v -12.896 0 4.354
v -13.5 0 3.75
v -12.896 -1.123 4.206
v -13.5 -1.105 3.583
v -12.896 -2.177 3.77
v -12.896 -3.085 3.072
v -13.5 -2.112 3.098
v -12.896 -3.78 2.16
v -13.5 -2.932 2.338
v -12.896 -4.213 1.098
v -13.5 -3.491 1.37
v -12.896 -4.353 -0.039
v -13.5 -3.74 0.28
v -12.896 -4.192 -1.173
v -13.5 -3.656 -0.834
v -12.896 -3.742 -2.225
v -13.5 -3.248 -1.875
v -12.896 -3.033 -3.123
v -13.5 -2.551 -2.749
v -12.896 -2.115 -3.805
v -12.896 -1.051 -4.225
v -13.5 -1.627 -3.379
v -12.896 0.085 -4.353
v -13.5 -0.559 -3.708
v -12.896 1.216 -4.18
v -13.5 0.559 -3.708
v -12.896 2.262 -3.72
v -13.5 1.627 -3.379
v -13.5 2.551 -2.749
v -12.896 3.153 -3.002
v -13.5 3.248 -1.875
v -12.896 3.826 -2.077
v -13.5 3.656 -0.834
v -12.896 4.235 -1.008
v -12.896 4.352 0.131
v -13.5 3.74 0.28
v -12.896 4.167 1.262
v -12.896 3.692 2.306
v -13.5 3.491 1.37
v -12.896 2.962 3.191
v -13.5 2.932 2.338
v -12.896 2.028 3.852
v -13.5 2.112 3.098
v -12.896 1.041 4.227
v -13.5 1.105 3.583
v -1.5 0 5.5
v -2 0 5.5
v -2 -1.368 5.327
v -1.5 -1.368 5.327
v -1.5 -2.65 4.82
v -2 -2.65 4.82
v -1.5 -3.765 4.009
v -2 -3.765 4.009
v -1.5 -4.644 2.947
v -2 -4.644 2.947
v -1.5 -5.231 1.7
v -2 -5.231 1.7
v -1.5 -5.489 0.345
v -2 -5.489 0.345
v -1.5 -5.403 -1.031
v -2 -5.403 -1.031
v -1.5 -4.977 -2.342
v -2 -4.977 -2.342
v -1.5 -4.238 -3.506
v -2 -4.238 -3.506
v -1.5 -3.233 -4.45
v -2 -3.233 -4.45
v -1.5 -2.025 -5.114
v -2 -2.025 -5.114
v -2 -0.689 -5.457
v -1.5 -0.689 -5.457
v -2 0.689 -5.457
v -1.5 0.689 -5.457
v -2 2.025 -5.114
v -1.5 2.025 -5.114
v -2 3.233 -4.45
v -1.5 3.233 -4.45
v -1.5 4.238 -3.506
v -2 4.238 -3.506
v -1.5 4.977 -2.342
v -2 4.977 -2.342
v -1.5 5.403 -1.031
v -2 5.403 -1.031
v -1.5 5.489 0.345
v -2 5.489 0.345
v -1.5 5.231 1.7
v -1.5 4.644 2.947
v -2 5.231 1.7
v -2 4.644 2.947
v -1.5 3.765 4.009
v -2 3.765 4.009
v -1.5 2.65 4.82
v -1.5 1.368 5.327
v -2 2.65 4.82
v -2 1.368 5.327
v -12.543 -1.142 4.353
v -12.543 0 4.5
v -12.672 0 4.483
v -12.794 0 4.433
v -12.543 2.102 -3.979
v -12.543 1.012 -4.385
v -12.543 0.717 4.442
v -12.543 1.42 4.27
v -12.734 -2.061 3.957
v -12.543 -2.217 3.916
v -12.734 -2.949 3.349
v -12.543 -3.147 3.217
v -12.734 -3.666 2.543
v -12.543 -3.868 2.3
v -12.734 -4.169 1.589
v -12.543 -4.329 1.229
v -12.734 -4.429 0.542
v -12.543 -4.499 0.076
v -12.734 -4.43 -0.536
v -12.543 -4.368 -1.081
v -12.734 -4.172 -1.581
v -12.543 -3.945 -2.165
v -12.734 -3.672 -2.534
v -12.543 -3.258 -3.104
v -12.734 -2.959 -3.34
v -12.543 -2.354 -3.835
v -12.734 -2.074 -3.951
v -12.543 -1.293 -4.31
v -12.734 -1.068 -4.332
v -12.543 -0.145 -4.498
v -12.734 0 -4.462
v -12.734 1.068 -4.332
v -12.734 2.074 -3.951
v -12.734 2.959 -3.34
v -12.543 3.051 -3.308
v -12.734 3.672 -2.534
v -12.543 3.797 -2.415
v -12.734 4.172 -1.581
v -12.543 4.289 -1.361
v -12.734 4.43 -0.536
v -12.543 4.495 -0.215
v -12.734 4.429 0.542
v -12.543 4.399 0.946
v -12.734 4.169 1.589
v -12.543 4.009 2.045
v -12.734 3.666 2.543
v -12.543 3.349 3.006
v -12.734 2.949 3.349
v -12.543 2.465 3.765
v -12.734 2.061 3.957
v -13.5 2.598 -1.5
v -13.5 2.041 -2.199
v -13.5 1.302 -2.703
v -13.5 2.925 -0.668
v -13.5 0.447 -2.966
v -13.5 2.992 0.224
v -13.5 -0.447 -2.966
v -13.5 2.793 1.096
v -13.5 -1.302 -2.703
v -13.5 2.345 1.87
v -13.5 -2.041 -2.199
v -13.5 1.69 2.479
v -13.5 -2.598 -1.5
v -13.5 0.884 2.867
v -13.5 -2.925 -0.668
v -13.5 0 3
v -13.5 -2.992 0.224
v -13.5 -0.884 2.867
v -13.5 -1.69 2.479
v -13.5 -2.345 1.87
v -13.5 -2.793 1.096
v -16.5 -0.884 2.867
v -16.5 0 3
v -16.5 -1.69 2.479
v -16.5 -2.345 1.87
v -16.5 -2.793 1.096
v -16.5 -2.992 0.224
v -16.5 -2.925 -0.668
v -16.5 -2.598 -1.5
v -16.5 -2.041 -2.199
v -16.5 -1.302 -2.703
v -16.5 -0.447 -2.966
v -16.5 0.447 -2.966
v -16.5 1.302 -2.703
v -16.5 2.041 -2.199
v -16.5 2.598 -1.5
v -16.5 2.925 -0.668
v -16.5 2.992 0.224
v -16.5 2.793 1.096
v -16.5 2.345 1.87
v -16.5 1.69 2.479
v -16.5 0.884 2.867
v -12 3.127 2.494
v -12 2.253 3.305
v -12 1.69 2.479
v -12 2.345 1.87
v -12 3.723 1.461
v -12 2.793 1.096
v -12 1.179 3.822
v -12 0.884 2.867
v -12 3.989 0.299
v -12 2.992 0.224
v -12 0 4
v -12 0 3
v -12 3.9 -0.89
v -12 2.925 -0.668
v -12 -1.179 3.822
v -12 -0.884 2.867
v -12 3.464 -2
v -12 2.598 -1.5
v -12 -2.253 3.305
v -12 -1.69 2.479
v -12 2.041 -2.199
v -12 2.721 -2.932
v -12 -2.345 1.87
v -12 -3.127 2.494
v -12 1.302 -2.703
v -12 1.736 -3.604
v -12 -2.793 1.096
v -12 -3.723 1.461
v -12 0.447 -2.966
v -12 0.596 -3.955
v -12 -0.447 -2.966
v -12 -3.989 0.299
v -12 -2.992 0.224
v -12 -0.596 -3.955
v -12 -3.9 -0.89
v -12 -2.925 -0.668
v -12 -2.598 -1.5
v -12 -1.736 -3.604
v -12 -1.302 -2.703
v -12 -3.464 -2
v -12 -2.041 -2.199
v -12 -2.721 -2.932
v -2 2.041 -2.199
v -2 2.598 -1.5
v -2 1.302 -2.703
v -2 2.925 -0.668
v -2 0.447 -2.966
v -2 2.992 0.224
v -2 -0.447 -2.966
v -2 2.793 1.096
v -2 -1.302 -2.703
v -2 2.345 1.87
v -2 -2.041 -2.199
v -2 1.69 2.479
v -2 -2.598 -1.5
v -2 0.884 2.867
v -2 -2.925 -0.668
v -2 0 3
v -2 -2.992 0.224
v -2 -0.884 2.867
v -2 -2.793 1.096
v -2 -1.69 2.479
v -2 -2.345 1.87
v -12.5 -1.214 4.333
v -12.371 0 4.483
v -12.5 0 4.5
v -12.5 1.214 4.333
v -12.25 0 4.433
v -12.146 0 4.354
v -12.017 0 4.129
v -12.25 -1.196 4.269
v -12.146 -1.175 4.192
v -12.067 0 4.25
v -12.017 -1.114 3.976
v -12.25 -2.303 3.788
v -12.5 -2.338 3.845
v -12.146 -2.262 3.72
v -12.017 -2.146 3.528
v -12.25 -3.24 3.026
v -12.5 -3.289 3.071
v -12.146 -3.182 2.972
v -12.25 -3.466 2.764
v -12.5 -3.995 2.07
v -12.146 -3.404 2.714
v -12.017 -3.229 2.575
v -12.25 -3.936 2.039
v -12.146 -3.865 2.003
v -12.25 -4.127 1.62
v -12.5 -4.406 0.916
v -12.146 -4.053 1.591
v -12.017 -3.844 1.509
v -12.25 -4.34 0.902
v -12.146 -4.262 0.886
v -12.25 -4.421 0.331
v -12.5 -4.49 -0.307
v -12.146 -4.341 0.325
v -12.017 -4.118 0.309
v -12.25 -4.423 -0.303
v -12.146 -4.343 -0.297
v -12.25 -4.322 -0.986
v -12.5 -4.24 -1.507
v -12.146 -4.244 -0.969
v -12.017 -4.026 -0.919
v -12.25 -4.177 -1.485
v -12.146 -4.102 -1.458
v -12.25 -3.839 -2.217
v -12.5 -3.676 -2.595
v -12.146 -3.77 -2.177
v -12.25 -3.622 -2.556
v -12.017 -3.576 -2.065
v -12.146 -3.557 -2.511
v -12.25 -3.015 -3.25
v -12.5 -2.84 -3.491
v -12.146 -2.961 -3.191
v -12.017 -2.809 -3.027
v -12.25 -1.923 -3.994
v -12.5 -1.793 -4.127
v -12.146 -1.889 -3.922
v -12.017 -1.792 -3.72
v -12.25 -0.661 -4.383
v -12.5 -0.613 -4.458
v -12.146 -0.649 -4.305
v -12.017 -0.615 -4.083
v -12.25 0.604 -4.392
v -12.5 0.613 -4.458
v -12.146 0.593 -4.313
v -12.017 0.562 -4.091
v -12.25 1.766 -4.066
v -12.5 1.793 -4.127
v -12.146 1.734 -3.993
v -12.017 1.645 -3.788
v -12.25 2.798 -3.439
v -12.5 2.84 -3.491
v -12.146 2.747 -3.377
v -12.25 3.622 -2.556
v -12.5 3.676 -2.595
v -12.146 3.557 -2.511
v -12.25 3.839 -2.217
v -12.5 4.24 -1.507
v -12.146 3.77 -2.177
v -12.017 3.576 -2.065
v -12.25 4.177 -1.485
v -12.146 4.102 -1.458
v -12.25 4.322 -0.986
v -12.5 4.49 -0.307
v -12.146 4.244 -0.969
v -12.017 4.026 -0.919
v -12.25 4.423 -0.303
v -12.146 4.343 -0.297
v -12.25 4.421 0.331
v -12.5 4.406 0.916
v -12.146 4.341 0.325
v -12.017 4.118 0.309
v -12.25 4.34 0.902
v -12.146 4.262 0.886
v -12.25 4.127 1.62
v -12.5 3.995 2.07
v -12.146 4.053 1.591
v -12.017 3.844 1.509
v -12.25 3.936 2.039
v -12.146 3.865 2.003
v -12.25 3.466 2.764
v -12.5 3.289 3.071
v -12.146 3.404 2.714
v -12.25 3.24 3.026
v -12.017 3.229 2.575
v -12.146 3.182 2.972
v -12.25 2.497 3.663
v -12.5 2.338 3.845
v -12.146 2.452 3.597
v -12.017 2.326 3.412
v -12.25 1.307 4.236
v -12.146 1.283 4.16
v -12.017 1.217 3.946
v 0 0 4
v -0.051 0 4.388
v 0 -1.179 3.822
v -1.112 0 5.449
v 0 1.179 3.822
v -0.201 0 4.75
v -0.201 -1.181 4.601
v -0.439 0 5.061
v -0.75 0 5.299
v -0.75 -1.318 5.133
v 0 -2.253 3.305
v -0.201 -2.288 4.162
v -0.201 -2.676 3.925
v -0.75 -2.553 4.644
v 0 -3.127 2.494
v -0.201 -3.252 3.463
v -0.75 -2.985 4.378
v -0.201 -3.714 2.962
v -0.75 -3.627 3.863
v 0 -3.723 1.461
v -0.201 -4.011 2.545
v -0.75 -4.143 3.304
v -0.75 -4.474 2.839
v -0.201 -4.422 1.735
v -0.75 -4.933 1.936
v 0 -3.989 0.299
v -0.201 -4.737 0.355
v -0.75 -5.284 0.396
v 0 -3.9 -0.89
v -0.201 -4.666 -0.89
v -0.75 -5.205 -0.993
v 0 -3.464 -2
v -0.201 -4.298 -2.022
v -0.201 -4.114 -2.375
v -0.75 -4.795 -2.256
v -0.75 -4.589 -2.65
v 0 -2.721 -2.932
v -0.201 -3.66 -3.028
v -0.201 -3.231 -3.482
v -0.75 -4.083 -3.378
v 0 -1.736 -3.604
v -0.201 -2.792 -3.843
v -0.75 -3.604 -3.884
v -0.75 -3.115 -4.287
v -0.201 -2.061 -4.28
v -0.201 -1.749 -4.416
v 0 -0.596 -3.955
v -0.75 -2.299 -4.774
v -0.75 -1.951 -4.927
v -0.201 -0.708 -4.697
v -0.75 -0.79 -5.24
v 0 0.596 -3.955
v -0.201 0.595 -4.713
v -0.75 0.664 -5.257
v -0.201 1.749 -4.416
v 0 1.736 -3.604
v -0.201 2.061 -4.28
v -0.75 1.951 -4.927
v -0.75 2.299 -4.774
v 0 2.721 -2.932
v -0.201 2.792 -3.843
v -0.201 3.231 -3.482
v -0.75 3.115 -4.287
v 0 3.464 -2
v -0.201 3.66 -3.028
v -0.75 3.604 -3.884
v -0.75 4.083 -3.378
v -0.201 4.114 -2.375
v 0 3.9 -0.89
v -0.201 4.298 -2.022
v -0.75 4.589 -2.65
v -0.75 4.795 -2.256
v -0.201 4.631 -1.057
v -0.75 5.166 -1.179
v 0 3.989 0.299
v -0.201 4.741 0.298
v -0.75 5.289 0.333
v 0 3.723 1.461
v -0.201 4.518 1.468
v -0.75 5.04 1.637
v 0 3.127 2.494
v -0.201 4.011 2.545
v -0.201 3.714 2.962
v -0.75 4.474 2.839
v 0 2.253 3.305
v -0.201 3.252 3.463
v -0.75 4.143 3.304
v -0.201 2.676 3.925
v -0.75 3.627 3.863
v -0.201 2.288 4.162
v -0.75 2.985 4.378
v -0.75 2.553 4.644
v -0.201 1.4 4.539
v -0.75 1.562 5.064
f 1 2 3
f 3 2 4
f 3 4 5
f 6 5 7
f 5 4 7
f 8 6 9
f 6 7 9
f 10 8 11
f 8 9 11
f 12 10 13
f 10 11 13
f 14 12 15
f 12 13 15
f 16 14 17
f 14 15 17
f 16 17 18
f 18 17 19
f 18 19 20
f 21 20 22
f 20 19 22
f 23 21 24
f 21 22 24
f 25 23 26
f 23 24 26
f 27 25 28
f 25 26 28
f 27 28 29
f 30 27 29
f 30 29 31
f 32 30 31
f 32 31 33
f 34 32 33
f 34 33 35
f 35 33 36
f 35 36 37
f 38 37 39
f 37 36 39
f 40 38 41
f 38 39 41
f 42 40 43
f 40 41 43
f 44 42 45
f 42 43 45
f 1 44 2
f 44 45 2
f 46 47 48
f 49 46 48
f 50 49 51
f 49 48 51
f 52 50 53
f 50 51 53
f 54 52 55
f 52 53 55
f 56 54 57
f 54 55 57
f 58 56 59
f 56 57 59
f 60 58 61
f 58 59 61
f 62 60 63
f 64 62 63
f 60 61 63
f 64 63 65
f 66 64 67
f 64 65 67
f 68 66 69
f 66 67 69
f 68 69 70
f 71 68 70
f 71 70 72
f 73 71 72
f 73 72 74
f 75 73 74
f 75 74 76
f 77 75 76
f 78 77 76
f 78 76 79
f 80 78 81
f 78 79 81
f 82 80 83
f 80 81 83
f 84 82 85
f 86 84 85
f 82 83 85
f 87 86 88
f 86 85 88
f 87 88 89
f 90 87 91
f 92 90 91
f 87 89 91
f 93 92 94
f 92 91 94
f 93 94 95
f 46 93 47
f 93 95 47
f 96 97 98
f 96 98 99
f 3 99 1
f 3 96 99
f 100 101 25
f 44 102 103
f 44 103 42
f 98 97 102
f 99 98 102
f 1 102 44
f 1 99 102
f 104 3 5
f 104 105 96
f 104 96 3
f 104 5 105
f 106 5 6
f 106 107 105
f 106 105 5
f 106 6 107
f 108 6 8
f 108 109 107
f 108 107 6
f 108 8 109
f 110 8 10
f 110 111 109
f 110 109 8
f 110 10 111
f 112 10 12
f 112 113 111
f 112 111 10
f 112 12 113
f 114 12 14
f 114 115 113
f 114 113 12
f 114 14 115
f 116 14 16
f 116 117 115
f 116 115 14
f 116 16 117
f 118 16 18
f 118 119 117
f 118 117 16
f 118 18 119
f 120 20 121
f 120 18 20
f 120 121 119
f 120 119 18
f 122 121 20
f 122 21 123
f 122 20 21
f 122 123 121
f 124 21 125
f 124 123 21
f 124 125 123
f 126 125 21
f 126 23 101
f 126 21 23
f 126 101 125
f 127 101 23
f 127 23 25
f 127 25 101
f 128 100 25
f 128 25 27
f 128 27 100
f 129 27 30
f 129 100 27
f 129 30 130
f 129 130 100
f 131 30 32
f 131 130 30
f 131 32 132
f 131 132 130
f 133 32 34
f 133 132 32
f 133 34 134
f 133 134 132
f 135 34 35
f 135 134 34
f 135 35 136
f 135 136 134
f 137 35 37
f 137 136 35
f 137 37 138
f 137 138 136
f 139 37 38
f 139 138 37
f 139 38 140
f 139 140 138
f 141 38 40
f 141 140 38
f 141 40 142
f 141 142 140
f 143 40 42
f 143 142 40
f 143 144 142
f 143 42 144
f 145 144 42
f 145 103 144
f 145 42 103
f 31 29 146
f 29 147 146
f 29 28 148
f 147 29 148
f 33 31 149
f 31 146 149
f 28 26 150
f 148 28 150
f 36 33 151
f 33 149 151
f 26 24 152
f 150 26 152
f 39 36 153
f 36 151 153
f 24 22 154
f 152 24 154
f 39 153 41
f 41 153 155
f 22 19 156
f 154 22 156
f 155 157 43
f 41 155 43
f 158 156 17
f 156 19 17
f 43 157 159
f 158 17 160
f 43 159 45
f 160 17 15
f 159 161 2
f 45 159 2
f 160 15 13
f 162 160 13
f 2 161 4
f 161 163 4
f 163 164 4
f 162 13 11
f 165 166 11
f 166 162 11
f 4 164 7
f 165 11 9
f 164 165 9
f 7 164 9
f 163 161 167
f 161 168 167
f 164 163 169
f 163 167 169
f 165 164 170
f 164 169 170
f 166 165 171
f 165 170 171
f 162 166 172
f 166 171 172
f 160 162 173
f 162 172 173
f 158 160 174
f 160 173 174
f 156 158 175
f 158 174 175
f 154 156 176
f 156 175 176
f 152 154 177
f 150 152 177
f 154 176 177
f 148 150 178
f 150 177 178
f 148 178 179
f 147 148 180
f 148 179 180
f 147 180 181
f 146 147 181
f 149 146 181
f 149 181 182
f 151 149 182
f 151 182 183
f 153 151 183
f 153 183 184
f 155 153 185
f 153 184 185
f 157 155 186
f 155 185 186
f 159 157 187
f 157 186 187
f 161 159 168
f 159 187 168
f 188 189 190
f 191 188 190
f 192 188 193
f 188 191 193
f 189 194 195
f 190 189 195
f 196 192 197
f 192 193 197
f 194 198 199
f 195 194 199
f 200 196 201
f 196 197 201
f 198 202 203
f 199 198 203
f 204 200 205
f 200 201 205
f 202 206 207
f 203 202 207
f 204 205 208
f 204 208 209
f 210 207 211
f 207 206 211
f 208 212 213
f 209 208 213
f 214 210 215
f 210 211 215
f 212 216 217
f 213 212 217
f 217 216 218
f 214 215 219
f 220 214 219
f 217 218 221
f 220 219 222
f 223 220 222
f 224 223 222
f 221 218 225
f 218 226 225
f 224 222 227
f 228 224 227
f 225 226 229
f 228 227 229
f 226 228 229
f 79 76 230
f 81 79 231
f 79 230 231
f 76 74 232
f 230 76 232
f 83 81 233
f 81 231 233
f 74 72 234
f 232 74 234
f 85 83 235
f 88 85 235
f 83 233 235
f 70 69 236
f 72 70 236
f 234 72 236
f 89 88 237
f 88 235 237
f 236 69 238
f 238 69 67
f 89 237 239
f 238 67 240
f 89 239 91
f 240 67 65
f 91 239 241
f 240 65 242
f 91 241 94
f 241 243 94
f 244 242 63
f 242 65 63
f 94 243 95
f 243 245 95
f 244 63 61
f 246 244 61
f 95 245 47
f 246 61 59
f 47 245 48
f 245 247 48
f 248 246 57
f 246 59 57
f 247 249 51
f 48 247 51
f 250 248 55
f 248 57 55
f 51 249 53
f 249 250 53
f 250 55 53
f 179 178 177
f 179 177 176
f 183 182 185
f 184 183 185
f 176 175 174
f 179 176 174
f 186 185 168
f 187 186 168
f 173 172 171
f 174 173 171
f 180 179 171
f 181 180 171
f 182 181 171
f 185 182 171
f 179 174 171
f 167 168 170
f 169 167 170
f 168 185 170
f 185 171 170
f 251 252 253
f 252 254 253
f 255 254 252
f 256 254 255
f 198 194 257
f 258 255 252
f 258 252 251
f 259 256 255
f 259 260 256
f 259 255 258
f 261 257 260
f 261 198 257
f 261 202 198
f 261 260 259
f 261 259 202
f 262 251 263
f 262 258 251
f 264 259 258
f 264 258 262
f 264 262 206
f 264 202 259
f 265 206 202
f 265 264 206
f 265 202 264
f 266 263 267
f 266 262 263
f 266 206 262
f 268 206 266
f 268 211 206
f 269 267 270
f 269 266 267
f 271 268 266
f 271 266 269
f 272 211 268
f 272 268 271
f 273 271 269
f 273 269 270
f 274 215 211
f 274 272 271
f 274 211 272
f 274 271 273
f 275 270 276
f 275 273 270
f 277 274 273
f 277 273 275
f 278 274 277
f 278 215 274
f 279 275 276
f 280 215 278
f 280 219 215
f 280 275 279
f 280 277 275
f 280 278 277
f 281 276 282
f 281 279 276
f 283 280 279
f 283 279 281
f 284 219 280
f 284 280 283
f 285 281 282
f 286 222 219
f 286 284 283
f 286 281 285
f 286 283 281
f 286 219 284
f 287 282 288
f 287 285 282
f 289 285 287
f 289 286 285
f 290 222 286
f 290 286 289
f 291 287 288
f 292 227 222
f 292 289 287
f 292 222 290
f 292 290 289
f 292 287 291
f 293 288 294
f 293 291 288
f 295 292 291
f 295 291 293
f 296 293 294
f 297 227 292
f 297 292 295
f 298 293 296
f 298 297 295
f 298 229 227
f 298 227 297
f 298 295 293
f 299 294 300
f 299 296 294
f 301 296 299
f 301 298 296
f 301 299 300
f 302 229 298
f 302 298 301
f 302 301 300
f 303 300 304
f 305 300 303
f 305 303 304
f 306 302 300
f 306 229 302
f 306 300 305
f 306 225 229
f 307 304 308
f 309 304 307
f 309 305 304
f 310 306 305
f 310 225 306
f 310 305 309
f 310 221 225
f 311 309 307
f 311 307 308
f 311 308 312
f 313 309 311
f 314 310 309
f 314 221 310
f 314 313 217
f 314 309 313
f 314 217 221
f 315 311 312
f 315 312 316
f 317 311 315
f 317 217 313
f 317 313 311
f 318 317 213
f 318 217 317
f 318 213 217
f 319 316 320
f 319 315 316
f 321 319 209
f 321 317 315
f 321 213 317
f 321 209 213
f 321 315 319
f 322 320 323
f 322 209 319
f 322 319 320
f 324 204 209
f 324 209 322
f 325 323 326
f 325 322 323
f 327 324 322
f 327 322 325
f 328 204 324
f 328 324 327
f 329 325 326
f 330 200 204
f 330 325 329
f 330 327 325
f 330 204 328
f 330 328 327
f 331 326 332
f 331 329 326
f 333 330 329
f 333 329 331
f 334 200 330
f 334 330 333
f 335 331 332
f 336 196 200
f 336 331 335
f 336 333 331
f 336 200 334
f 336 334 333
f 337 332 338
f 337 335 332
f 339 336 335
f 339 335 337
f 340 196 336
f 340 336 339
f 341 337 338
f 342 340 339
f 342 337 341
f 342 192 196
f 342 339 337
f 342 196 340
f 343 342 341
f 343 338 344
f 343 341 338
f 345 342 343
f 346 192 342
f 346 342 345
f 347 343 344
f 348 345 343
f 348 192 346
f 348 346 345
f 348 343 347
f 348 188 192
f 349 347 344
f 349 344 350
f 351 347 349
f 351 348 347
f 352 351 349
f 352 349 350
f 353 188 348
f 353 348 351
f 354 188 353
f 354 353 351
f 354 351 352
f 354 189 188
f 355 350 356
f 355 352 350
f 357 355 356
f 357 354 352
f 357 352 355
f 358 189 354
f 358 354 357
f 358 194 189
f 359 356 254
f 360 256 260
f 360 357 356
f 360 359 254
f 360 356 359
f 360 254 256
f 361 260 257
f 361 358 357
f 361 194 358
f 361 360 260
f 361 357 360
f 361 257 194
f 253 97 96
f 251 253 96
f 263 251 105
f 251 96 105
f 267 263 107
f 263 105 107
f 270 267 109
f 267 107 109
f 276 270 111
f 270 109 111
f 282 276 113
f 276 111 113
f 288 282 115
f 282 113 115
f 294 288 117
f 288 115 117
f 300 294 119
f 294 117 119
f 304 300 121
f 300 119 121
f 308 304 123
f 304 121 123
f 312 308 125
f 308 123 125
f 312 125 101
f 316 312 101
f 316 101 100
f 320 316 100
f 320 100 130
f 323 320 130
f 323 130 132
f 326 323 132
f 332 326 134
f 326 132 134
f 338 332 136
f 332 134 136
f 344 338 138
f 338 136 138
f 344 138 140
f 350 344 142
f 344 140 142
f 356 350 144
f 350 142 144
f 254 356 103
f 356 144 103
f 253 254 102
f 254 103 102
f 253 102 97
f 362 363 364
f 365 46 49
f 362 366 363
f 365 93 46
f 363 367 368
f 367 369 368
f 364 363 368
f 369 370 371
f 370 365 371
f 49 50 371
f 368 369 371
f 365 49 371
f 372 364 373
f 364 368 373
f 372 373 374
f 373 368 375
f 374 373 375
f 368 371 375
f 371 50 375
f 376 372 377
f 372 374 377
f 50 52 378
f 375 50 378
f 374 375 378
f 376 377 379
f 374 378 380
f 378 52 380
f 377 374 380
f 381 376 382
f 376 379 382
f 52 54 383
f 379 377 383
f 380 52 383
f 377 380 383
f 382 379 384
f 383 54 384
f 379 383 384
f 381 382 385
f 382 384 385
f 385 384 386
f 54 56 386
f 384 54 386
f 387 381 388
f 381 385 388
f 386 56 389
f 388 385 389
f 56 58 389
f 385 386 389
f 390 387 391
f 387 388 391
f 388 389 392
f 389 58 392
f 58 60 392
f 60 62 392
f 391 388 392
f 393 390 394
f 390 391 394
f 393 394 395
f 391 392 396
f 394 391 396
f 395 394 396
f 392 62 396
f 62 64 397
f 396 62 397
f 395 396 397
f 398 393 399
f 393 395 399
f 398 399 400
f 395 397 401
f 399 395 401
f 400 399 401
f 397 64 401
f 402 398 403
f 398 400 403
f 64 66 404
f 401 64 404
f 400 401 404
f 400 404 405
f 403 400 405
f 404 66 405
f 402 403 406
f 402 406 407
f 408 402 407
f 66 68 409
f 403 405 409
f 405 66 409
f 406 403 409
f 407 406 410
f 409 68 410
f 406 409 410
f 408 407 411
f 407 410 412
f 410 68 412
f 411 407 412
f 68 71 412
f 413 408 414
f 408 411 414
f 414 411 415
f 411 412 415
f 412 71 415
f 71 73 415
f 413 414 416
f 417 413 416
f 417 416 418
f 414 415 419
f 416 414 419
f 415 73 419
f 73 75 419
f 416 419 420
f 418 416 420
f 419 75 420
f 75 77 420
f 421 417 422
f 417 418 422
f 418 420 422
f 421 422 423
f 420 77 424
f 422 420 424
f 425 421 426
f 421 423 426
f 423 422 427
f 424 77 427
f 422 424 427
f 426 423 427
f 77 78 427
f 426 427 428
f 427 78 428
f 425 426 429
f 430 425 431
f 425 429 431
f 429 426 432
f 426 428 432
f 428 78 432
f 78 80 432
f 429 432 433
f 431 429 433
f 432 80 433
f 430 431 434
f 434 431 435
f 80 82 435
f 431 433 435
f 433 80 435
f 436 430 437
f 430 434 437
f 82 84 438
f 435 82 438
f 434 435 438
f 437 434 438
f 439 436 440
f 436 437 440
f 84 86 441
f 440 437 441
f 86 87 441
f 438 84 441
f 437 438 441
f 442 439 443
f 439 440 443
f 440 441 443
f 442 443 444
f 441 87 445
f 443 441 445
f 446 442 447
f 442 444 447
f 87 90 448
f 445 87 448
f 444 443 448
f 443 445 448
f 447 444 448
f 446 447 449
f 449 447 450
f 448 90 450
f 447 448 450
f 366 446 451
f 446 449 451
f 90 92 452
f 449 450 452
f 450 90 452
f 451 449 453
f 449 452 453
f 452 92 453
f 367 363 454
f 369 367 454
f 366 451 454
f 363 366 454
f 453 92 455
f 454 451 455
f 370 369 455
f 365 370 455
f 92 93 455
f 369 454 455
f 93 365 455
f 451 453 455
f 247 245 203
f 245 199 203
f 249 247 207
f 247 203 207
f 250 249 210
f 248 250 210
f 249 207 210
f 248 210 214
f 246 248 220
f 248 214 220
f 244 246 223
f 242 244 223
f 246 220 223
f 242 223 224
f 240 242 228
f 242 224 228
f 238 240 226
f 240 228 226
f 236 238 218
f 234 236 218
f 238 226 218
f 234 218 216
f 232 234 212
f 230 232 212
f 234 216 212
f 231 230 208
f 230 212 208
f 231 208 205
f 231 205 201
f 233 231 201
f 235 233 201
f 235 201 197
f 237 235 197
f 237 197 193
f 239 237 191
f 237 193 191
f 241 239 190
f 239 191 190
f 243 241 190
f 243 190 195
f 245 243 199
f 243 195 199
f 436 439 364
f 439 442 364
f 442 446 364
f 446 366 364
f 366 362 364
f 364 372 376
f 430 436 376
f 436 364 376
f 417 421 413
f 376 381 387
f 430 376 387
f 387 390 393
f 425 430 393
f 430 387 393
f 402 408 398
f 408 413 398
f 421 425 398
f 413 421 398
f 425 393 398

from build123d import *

# Parameters (mm, degrees)
FILLET1_R     = 1.5
CHAMFER1_SIZE = 0.75
FILLET2_R     = 0.5


with BuildPart() as part:
    # Sketch2 → Revolve1 (revolve)
    with BuildSketch(Plane.XY, mode=Mode.PRIVATE) as revolve1_sk:
        Polygon((0, 0), (0, 5.5), (-2, 5.5), (-2, 3), (-12, 3), (-12, 4.5), (-13.5, 4.5), (-13.5, 3), (-16.5, 3), (-16.5, 0), align=None)
    revolve(revolve1_sk.sketch.rotate(Axis((-42.300017882, 0, 0), (1, 0, 0)), 90), axis=Axis((-42.300017882, 0, 0), (1, 0, 0)))

    # Fillet1
    fillet1_edges = [part.edges().sort_by_distance(p)[0] for p in [
        (0, 0, -5.5),
    ]]
    fillet(fillet1_edges, radius=FILLET1_R)

    # Chamfer1
    chamfer1_edges = [part.edges().sort_by_distance(p)[0] for p in [
        (-13.5, 0, -4.5),
    ]]
    chamfer(chamfer1_edges, length=CHAMFER1_SIZE)

    # Fillet2
    fillet2_edges = [part.edges().sort_by_distance(p)[0] for p in [
        (-12.75, 0, -4.5),
        (-12, 0, -4.5),
    ]]
    fillet(fillet2_edges, radius=FILLET2_R)


solid = part.part
